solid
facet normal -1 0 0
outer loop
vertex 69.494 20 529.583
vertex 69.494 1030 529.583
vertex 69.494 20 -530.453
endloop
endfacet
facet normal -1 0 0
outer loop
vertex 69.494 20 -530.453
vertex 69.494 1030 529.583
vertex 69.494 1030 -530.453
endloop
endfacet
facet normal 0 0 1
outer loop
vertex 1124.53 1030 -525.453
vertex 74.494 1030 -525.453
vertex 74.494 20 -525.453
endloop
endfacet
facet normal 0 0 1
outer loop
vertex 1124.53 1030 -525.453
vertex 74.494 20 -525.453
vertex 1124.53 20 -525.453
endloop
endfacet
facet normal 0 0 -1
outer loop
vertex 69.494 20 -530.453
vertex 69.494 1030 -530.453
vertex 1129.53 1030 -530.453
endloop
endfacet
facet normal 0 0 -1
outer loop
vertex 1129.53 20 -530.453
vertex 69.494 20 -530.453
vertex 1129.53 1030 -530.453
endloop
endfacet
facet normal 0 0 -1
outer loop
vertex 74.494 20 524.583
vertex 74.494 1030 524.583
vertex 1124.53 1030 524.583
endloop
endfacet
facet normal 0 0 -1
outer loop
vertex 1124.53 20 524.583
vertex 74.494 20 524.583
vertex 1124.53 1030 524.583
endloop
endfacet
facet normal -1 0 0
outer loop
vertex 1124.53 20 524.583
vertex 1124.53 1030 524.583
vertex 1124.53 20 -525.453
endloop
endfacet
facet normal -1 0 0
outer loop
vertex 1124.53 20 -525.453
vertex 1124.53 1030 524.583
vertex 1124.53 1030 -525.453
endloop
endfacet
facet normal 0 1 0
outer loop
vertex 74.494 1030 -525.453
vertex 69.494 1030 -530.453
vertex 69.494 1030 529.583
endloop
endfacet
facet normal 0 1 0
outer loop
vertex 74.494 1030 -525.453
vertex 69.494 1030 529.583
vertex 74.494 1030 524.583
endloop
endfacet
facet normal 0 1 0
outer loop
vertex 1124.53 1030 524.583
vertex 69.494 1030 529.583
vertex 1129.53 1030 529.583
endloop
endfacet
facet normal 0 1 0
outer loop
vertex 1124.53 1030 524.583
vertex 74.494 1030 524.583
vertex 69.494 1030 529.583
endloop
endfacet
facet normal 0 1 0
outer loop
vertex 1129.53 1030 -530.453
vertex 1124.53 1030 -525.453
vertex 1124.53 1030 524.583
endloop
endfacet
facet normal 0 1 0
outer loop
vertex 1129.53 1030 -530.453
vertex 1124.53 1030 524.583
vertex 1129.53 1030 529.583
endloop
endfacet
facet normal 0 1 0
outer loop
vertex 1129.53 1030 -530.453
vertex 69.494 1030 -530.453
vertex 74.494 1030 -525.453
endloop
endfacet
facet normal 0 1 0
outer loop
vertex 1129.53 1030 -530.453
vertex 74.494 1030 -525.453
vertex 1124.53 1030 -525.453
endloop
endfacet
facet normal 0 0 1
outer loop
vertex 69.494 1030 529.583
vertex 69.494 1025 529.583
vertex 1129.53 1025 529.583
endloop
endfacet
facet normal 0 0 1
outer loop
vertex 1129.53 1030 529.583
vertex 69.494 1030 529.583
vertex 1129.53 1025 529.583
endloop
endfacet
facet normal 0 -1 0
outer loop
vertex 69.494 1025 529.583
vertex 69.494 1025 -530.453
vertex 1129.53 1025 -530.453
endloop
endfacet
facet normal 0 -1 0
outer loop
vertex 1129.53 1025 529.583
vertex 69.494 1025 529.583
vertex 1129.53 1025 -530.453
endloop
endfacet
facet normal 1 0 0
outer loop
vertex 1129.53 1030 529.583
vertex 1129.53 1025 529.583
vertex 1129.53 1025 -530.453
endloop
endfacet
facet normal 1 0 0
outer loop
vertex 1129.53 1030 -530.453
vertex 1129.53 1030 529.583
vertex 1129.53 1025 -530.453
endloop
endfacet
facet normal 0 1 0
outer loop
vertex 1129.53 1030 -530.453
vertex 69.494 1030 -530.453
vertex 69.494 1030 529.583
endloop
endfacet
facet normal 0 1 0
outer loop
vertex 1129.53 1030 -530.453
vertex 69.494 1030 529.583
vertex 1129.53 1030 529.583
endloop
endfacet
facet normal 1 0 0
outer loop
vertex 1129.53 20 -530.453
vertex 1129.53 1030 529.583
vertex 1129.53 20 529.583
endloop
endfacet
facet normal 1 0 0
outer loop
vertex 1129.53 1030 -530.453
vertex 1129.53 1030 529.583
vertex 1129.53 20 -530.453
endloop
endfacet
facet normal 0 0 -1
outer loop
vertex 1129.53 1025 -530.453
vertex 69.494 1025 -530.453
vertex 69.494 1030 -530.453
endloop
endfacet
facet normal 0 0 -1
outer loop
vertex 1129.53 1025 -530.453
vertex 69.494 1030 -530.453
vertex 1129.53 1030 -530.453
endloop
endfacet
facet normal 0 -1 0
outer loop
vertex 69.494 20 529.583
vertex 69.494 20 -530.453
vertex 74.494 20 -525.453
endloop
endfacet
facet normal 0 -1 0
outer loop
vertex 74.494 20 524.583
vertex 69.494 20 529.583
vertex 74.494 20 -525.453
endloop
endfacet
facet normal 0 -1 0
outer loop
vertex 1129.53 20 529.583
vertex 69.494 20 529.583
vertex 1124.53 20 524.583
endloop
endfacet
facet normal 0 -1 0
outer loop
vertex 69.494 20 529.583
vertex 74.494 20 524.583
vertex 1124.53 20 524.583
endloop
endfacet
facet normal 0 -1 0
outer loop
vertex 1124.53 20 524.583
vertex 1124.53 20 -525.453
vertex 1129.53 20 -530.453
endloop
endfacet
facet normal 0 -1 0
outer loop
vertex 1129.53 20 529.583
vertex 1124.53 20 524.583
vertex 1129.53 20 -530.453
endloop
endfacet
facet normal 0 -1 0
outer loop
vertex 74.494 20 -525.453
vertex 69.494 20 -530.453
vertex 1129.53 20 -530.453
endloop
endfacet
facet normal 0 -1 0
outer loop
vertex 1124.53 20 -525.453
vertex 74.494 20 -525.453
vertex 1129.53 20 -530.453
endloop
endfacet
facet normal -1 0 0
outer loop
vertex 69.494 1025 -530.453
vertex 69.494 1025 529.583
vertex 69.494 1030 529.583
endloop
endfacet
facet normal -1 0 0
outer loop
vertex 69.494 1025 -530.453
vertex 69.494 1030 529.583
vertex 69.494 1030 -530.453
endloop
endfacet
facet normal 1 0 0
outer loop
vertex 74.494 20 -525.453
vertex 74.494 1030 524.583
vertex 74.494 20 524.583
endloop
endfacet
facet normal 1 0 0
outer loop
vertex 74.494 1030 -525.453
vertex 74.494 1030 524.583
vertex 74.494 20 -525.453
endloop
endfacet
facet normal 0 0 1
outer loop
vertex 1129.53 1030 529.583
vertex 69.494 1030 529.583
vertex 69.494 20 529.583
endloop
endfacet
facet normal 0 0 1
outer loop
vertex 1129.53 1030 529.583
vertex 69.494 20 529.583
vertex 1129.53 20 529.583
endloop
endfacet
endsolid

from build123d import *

# Parameters (mm, degrees)
SKETCH2_W           = 1060.036
SKETCH2_H           = 1060.036
SKETCH2_W_2         = 1050.036
SKETCH2_H_2         = 1050.036
EXTRUDE_THIN1_DEPTH = 1010
SKETCH4_W           = 1060.036
SKETCH4_H           = 1060.036
BOSS_EXTRUDE1_DEPTH = 5


with BuildPart() as part:
    # Sketch2 → Extrude-Thin1 (new body)
    with BuildSketch(Plane(origin=(0, 1030, 0), x_dir=(1, 0, 0), z_dir=(0, 1, 0))):
        with Locations((599.511716421, 0.434855008)):
            Rectangle(SKETCH2_W, SKETCH2_H)
        with Locations((599.511716421, 0.434855008)):
            Rectangle(SKETCH2_W_2, SKETCH2_H_2, mode=Mode.SUBTRACT)
    extrude(amount=-EXTRUDE_THIN1_DEPTH)


with BuildPart() as body_2:
    # Sketch4 → Boss-Extrude1 (new body)
    with BuildSketch(Plane(origin=(0, 1025, 0), x_dir=(1, 0, 0), z_dir=(0, 1, 0))):
        with Locations((599.511716421, 0.434855008)):
            Rectangle(SKETCH4_W, SKETCH4_H)
    extrude(amount=BOSS_EXTRUDE1_DEPTH)


solid = Compound([part.part, body_2.part])
